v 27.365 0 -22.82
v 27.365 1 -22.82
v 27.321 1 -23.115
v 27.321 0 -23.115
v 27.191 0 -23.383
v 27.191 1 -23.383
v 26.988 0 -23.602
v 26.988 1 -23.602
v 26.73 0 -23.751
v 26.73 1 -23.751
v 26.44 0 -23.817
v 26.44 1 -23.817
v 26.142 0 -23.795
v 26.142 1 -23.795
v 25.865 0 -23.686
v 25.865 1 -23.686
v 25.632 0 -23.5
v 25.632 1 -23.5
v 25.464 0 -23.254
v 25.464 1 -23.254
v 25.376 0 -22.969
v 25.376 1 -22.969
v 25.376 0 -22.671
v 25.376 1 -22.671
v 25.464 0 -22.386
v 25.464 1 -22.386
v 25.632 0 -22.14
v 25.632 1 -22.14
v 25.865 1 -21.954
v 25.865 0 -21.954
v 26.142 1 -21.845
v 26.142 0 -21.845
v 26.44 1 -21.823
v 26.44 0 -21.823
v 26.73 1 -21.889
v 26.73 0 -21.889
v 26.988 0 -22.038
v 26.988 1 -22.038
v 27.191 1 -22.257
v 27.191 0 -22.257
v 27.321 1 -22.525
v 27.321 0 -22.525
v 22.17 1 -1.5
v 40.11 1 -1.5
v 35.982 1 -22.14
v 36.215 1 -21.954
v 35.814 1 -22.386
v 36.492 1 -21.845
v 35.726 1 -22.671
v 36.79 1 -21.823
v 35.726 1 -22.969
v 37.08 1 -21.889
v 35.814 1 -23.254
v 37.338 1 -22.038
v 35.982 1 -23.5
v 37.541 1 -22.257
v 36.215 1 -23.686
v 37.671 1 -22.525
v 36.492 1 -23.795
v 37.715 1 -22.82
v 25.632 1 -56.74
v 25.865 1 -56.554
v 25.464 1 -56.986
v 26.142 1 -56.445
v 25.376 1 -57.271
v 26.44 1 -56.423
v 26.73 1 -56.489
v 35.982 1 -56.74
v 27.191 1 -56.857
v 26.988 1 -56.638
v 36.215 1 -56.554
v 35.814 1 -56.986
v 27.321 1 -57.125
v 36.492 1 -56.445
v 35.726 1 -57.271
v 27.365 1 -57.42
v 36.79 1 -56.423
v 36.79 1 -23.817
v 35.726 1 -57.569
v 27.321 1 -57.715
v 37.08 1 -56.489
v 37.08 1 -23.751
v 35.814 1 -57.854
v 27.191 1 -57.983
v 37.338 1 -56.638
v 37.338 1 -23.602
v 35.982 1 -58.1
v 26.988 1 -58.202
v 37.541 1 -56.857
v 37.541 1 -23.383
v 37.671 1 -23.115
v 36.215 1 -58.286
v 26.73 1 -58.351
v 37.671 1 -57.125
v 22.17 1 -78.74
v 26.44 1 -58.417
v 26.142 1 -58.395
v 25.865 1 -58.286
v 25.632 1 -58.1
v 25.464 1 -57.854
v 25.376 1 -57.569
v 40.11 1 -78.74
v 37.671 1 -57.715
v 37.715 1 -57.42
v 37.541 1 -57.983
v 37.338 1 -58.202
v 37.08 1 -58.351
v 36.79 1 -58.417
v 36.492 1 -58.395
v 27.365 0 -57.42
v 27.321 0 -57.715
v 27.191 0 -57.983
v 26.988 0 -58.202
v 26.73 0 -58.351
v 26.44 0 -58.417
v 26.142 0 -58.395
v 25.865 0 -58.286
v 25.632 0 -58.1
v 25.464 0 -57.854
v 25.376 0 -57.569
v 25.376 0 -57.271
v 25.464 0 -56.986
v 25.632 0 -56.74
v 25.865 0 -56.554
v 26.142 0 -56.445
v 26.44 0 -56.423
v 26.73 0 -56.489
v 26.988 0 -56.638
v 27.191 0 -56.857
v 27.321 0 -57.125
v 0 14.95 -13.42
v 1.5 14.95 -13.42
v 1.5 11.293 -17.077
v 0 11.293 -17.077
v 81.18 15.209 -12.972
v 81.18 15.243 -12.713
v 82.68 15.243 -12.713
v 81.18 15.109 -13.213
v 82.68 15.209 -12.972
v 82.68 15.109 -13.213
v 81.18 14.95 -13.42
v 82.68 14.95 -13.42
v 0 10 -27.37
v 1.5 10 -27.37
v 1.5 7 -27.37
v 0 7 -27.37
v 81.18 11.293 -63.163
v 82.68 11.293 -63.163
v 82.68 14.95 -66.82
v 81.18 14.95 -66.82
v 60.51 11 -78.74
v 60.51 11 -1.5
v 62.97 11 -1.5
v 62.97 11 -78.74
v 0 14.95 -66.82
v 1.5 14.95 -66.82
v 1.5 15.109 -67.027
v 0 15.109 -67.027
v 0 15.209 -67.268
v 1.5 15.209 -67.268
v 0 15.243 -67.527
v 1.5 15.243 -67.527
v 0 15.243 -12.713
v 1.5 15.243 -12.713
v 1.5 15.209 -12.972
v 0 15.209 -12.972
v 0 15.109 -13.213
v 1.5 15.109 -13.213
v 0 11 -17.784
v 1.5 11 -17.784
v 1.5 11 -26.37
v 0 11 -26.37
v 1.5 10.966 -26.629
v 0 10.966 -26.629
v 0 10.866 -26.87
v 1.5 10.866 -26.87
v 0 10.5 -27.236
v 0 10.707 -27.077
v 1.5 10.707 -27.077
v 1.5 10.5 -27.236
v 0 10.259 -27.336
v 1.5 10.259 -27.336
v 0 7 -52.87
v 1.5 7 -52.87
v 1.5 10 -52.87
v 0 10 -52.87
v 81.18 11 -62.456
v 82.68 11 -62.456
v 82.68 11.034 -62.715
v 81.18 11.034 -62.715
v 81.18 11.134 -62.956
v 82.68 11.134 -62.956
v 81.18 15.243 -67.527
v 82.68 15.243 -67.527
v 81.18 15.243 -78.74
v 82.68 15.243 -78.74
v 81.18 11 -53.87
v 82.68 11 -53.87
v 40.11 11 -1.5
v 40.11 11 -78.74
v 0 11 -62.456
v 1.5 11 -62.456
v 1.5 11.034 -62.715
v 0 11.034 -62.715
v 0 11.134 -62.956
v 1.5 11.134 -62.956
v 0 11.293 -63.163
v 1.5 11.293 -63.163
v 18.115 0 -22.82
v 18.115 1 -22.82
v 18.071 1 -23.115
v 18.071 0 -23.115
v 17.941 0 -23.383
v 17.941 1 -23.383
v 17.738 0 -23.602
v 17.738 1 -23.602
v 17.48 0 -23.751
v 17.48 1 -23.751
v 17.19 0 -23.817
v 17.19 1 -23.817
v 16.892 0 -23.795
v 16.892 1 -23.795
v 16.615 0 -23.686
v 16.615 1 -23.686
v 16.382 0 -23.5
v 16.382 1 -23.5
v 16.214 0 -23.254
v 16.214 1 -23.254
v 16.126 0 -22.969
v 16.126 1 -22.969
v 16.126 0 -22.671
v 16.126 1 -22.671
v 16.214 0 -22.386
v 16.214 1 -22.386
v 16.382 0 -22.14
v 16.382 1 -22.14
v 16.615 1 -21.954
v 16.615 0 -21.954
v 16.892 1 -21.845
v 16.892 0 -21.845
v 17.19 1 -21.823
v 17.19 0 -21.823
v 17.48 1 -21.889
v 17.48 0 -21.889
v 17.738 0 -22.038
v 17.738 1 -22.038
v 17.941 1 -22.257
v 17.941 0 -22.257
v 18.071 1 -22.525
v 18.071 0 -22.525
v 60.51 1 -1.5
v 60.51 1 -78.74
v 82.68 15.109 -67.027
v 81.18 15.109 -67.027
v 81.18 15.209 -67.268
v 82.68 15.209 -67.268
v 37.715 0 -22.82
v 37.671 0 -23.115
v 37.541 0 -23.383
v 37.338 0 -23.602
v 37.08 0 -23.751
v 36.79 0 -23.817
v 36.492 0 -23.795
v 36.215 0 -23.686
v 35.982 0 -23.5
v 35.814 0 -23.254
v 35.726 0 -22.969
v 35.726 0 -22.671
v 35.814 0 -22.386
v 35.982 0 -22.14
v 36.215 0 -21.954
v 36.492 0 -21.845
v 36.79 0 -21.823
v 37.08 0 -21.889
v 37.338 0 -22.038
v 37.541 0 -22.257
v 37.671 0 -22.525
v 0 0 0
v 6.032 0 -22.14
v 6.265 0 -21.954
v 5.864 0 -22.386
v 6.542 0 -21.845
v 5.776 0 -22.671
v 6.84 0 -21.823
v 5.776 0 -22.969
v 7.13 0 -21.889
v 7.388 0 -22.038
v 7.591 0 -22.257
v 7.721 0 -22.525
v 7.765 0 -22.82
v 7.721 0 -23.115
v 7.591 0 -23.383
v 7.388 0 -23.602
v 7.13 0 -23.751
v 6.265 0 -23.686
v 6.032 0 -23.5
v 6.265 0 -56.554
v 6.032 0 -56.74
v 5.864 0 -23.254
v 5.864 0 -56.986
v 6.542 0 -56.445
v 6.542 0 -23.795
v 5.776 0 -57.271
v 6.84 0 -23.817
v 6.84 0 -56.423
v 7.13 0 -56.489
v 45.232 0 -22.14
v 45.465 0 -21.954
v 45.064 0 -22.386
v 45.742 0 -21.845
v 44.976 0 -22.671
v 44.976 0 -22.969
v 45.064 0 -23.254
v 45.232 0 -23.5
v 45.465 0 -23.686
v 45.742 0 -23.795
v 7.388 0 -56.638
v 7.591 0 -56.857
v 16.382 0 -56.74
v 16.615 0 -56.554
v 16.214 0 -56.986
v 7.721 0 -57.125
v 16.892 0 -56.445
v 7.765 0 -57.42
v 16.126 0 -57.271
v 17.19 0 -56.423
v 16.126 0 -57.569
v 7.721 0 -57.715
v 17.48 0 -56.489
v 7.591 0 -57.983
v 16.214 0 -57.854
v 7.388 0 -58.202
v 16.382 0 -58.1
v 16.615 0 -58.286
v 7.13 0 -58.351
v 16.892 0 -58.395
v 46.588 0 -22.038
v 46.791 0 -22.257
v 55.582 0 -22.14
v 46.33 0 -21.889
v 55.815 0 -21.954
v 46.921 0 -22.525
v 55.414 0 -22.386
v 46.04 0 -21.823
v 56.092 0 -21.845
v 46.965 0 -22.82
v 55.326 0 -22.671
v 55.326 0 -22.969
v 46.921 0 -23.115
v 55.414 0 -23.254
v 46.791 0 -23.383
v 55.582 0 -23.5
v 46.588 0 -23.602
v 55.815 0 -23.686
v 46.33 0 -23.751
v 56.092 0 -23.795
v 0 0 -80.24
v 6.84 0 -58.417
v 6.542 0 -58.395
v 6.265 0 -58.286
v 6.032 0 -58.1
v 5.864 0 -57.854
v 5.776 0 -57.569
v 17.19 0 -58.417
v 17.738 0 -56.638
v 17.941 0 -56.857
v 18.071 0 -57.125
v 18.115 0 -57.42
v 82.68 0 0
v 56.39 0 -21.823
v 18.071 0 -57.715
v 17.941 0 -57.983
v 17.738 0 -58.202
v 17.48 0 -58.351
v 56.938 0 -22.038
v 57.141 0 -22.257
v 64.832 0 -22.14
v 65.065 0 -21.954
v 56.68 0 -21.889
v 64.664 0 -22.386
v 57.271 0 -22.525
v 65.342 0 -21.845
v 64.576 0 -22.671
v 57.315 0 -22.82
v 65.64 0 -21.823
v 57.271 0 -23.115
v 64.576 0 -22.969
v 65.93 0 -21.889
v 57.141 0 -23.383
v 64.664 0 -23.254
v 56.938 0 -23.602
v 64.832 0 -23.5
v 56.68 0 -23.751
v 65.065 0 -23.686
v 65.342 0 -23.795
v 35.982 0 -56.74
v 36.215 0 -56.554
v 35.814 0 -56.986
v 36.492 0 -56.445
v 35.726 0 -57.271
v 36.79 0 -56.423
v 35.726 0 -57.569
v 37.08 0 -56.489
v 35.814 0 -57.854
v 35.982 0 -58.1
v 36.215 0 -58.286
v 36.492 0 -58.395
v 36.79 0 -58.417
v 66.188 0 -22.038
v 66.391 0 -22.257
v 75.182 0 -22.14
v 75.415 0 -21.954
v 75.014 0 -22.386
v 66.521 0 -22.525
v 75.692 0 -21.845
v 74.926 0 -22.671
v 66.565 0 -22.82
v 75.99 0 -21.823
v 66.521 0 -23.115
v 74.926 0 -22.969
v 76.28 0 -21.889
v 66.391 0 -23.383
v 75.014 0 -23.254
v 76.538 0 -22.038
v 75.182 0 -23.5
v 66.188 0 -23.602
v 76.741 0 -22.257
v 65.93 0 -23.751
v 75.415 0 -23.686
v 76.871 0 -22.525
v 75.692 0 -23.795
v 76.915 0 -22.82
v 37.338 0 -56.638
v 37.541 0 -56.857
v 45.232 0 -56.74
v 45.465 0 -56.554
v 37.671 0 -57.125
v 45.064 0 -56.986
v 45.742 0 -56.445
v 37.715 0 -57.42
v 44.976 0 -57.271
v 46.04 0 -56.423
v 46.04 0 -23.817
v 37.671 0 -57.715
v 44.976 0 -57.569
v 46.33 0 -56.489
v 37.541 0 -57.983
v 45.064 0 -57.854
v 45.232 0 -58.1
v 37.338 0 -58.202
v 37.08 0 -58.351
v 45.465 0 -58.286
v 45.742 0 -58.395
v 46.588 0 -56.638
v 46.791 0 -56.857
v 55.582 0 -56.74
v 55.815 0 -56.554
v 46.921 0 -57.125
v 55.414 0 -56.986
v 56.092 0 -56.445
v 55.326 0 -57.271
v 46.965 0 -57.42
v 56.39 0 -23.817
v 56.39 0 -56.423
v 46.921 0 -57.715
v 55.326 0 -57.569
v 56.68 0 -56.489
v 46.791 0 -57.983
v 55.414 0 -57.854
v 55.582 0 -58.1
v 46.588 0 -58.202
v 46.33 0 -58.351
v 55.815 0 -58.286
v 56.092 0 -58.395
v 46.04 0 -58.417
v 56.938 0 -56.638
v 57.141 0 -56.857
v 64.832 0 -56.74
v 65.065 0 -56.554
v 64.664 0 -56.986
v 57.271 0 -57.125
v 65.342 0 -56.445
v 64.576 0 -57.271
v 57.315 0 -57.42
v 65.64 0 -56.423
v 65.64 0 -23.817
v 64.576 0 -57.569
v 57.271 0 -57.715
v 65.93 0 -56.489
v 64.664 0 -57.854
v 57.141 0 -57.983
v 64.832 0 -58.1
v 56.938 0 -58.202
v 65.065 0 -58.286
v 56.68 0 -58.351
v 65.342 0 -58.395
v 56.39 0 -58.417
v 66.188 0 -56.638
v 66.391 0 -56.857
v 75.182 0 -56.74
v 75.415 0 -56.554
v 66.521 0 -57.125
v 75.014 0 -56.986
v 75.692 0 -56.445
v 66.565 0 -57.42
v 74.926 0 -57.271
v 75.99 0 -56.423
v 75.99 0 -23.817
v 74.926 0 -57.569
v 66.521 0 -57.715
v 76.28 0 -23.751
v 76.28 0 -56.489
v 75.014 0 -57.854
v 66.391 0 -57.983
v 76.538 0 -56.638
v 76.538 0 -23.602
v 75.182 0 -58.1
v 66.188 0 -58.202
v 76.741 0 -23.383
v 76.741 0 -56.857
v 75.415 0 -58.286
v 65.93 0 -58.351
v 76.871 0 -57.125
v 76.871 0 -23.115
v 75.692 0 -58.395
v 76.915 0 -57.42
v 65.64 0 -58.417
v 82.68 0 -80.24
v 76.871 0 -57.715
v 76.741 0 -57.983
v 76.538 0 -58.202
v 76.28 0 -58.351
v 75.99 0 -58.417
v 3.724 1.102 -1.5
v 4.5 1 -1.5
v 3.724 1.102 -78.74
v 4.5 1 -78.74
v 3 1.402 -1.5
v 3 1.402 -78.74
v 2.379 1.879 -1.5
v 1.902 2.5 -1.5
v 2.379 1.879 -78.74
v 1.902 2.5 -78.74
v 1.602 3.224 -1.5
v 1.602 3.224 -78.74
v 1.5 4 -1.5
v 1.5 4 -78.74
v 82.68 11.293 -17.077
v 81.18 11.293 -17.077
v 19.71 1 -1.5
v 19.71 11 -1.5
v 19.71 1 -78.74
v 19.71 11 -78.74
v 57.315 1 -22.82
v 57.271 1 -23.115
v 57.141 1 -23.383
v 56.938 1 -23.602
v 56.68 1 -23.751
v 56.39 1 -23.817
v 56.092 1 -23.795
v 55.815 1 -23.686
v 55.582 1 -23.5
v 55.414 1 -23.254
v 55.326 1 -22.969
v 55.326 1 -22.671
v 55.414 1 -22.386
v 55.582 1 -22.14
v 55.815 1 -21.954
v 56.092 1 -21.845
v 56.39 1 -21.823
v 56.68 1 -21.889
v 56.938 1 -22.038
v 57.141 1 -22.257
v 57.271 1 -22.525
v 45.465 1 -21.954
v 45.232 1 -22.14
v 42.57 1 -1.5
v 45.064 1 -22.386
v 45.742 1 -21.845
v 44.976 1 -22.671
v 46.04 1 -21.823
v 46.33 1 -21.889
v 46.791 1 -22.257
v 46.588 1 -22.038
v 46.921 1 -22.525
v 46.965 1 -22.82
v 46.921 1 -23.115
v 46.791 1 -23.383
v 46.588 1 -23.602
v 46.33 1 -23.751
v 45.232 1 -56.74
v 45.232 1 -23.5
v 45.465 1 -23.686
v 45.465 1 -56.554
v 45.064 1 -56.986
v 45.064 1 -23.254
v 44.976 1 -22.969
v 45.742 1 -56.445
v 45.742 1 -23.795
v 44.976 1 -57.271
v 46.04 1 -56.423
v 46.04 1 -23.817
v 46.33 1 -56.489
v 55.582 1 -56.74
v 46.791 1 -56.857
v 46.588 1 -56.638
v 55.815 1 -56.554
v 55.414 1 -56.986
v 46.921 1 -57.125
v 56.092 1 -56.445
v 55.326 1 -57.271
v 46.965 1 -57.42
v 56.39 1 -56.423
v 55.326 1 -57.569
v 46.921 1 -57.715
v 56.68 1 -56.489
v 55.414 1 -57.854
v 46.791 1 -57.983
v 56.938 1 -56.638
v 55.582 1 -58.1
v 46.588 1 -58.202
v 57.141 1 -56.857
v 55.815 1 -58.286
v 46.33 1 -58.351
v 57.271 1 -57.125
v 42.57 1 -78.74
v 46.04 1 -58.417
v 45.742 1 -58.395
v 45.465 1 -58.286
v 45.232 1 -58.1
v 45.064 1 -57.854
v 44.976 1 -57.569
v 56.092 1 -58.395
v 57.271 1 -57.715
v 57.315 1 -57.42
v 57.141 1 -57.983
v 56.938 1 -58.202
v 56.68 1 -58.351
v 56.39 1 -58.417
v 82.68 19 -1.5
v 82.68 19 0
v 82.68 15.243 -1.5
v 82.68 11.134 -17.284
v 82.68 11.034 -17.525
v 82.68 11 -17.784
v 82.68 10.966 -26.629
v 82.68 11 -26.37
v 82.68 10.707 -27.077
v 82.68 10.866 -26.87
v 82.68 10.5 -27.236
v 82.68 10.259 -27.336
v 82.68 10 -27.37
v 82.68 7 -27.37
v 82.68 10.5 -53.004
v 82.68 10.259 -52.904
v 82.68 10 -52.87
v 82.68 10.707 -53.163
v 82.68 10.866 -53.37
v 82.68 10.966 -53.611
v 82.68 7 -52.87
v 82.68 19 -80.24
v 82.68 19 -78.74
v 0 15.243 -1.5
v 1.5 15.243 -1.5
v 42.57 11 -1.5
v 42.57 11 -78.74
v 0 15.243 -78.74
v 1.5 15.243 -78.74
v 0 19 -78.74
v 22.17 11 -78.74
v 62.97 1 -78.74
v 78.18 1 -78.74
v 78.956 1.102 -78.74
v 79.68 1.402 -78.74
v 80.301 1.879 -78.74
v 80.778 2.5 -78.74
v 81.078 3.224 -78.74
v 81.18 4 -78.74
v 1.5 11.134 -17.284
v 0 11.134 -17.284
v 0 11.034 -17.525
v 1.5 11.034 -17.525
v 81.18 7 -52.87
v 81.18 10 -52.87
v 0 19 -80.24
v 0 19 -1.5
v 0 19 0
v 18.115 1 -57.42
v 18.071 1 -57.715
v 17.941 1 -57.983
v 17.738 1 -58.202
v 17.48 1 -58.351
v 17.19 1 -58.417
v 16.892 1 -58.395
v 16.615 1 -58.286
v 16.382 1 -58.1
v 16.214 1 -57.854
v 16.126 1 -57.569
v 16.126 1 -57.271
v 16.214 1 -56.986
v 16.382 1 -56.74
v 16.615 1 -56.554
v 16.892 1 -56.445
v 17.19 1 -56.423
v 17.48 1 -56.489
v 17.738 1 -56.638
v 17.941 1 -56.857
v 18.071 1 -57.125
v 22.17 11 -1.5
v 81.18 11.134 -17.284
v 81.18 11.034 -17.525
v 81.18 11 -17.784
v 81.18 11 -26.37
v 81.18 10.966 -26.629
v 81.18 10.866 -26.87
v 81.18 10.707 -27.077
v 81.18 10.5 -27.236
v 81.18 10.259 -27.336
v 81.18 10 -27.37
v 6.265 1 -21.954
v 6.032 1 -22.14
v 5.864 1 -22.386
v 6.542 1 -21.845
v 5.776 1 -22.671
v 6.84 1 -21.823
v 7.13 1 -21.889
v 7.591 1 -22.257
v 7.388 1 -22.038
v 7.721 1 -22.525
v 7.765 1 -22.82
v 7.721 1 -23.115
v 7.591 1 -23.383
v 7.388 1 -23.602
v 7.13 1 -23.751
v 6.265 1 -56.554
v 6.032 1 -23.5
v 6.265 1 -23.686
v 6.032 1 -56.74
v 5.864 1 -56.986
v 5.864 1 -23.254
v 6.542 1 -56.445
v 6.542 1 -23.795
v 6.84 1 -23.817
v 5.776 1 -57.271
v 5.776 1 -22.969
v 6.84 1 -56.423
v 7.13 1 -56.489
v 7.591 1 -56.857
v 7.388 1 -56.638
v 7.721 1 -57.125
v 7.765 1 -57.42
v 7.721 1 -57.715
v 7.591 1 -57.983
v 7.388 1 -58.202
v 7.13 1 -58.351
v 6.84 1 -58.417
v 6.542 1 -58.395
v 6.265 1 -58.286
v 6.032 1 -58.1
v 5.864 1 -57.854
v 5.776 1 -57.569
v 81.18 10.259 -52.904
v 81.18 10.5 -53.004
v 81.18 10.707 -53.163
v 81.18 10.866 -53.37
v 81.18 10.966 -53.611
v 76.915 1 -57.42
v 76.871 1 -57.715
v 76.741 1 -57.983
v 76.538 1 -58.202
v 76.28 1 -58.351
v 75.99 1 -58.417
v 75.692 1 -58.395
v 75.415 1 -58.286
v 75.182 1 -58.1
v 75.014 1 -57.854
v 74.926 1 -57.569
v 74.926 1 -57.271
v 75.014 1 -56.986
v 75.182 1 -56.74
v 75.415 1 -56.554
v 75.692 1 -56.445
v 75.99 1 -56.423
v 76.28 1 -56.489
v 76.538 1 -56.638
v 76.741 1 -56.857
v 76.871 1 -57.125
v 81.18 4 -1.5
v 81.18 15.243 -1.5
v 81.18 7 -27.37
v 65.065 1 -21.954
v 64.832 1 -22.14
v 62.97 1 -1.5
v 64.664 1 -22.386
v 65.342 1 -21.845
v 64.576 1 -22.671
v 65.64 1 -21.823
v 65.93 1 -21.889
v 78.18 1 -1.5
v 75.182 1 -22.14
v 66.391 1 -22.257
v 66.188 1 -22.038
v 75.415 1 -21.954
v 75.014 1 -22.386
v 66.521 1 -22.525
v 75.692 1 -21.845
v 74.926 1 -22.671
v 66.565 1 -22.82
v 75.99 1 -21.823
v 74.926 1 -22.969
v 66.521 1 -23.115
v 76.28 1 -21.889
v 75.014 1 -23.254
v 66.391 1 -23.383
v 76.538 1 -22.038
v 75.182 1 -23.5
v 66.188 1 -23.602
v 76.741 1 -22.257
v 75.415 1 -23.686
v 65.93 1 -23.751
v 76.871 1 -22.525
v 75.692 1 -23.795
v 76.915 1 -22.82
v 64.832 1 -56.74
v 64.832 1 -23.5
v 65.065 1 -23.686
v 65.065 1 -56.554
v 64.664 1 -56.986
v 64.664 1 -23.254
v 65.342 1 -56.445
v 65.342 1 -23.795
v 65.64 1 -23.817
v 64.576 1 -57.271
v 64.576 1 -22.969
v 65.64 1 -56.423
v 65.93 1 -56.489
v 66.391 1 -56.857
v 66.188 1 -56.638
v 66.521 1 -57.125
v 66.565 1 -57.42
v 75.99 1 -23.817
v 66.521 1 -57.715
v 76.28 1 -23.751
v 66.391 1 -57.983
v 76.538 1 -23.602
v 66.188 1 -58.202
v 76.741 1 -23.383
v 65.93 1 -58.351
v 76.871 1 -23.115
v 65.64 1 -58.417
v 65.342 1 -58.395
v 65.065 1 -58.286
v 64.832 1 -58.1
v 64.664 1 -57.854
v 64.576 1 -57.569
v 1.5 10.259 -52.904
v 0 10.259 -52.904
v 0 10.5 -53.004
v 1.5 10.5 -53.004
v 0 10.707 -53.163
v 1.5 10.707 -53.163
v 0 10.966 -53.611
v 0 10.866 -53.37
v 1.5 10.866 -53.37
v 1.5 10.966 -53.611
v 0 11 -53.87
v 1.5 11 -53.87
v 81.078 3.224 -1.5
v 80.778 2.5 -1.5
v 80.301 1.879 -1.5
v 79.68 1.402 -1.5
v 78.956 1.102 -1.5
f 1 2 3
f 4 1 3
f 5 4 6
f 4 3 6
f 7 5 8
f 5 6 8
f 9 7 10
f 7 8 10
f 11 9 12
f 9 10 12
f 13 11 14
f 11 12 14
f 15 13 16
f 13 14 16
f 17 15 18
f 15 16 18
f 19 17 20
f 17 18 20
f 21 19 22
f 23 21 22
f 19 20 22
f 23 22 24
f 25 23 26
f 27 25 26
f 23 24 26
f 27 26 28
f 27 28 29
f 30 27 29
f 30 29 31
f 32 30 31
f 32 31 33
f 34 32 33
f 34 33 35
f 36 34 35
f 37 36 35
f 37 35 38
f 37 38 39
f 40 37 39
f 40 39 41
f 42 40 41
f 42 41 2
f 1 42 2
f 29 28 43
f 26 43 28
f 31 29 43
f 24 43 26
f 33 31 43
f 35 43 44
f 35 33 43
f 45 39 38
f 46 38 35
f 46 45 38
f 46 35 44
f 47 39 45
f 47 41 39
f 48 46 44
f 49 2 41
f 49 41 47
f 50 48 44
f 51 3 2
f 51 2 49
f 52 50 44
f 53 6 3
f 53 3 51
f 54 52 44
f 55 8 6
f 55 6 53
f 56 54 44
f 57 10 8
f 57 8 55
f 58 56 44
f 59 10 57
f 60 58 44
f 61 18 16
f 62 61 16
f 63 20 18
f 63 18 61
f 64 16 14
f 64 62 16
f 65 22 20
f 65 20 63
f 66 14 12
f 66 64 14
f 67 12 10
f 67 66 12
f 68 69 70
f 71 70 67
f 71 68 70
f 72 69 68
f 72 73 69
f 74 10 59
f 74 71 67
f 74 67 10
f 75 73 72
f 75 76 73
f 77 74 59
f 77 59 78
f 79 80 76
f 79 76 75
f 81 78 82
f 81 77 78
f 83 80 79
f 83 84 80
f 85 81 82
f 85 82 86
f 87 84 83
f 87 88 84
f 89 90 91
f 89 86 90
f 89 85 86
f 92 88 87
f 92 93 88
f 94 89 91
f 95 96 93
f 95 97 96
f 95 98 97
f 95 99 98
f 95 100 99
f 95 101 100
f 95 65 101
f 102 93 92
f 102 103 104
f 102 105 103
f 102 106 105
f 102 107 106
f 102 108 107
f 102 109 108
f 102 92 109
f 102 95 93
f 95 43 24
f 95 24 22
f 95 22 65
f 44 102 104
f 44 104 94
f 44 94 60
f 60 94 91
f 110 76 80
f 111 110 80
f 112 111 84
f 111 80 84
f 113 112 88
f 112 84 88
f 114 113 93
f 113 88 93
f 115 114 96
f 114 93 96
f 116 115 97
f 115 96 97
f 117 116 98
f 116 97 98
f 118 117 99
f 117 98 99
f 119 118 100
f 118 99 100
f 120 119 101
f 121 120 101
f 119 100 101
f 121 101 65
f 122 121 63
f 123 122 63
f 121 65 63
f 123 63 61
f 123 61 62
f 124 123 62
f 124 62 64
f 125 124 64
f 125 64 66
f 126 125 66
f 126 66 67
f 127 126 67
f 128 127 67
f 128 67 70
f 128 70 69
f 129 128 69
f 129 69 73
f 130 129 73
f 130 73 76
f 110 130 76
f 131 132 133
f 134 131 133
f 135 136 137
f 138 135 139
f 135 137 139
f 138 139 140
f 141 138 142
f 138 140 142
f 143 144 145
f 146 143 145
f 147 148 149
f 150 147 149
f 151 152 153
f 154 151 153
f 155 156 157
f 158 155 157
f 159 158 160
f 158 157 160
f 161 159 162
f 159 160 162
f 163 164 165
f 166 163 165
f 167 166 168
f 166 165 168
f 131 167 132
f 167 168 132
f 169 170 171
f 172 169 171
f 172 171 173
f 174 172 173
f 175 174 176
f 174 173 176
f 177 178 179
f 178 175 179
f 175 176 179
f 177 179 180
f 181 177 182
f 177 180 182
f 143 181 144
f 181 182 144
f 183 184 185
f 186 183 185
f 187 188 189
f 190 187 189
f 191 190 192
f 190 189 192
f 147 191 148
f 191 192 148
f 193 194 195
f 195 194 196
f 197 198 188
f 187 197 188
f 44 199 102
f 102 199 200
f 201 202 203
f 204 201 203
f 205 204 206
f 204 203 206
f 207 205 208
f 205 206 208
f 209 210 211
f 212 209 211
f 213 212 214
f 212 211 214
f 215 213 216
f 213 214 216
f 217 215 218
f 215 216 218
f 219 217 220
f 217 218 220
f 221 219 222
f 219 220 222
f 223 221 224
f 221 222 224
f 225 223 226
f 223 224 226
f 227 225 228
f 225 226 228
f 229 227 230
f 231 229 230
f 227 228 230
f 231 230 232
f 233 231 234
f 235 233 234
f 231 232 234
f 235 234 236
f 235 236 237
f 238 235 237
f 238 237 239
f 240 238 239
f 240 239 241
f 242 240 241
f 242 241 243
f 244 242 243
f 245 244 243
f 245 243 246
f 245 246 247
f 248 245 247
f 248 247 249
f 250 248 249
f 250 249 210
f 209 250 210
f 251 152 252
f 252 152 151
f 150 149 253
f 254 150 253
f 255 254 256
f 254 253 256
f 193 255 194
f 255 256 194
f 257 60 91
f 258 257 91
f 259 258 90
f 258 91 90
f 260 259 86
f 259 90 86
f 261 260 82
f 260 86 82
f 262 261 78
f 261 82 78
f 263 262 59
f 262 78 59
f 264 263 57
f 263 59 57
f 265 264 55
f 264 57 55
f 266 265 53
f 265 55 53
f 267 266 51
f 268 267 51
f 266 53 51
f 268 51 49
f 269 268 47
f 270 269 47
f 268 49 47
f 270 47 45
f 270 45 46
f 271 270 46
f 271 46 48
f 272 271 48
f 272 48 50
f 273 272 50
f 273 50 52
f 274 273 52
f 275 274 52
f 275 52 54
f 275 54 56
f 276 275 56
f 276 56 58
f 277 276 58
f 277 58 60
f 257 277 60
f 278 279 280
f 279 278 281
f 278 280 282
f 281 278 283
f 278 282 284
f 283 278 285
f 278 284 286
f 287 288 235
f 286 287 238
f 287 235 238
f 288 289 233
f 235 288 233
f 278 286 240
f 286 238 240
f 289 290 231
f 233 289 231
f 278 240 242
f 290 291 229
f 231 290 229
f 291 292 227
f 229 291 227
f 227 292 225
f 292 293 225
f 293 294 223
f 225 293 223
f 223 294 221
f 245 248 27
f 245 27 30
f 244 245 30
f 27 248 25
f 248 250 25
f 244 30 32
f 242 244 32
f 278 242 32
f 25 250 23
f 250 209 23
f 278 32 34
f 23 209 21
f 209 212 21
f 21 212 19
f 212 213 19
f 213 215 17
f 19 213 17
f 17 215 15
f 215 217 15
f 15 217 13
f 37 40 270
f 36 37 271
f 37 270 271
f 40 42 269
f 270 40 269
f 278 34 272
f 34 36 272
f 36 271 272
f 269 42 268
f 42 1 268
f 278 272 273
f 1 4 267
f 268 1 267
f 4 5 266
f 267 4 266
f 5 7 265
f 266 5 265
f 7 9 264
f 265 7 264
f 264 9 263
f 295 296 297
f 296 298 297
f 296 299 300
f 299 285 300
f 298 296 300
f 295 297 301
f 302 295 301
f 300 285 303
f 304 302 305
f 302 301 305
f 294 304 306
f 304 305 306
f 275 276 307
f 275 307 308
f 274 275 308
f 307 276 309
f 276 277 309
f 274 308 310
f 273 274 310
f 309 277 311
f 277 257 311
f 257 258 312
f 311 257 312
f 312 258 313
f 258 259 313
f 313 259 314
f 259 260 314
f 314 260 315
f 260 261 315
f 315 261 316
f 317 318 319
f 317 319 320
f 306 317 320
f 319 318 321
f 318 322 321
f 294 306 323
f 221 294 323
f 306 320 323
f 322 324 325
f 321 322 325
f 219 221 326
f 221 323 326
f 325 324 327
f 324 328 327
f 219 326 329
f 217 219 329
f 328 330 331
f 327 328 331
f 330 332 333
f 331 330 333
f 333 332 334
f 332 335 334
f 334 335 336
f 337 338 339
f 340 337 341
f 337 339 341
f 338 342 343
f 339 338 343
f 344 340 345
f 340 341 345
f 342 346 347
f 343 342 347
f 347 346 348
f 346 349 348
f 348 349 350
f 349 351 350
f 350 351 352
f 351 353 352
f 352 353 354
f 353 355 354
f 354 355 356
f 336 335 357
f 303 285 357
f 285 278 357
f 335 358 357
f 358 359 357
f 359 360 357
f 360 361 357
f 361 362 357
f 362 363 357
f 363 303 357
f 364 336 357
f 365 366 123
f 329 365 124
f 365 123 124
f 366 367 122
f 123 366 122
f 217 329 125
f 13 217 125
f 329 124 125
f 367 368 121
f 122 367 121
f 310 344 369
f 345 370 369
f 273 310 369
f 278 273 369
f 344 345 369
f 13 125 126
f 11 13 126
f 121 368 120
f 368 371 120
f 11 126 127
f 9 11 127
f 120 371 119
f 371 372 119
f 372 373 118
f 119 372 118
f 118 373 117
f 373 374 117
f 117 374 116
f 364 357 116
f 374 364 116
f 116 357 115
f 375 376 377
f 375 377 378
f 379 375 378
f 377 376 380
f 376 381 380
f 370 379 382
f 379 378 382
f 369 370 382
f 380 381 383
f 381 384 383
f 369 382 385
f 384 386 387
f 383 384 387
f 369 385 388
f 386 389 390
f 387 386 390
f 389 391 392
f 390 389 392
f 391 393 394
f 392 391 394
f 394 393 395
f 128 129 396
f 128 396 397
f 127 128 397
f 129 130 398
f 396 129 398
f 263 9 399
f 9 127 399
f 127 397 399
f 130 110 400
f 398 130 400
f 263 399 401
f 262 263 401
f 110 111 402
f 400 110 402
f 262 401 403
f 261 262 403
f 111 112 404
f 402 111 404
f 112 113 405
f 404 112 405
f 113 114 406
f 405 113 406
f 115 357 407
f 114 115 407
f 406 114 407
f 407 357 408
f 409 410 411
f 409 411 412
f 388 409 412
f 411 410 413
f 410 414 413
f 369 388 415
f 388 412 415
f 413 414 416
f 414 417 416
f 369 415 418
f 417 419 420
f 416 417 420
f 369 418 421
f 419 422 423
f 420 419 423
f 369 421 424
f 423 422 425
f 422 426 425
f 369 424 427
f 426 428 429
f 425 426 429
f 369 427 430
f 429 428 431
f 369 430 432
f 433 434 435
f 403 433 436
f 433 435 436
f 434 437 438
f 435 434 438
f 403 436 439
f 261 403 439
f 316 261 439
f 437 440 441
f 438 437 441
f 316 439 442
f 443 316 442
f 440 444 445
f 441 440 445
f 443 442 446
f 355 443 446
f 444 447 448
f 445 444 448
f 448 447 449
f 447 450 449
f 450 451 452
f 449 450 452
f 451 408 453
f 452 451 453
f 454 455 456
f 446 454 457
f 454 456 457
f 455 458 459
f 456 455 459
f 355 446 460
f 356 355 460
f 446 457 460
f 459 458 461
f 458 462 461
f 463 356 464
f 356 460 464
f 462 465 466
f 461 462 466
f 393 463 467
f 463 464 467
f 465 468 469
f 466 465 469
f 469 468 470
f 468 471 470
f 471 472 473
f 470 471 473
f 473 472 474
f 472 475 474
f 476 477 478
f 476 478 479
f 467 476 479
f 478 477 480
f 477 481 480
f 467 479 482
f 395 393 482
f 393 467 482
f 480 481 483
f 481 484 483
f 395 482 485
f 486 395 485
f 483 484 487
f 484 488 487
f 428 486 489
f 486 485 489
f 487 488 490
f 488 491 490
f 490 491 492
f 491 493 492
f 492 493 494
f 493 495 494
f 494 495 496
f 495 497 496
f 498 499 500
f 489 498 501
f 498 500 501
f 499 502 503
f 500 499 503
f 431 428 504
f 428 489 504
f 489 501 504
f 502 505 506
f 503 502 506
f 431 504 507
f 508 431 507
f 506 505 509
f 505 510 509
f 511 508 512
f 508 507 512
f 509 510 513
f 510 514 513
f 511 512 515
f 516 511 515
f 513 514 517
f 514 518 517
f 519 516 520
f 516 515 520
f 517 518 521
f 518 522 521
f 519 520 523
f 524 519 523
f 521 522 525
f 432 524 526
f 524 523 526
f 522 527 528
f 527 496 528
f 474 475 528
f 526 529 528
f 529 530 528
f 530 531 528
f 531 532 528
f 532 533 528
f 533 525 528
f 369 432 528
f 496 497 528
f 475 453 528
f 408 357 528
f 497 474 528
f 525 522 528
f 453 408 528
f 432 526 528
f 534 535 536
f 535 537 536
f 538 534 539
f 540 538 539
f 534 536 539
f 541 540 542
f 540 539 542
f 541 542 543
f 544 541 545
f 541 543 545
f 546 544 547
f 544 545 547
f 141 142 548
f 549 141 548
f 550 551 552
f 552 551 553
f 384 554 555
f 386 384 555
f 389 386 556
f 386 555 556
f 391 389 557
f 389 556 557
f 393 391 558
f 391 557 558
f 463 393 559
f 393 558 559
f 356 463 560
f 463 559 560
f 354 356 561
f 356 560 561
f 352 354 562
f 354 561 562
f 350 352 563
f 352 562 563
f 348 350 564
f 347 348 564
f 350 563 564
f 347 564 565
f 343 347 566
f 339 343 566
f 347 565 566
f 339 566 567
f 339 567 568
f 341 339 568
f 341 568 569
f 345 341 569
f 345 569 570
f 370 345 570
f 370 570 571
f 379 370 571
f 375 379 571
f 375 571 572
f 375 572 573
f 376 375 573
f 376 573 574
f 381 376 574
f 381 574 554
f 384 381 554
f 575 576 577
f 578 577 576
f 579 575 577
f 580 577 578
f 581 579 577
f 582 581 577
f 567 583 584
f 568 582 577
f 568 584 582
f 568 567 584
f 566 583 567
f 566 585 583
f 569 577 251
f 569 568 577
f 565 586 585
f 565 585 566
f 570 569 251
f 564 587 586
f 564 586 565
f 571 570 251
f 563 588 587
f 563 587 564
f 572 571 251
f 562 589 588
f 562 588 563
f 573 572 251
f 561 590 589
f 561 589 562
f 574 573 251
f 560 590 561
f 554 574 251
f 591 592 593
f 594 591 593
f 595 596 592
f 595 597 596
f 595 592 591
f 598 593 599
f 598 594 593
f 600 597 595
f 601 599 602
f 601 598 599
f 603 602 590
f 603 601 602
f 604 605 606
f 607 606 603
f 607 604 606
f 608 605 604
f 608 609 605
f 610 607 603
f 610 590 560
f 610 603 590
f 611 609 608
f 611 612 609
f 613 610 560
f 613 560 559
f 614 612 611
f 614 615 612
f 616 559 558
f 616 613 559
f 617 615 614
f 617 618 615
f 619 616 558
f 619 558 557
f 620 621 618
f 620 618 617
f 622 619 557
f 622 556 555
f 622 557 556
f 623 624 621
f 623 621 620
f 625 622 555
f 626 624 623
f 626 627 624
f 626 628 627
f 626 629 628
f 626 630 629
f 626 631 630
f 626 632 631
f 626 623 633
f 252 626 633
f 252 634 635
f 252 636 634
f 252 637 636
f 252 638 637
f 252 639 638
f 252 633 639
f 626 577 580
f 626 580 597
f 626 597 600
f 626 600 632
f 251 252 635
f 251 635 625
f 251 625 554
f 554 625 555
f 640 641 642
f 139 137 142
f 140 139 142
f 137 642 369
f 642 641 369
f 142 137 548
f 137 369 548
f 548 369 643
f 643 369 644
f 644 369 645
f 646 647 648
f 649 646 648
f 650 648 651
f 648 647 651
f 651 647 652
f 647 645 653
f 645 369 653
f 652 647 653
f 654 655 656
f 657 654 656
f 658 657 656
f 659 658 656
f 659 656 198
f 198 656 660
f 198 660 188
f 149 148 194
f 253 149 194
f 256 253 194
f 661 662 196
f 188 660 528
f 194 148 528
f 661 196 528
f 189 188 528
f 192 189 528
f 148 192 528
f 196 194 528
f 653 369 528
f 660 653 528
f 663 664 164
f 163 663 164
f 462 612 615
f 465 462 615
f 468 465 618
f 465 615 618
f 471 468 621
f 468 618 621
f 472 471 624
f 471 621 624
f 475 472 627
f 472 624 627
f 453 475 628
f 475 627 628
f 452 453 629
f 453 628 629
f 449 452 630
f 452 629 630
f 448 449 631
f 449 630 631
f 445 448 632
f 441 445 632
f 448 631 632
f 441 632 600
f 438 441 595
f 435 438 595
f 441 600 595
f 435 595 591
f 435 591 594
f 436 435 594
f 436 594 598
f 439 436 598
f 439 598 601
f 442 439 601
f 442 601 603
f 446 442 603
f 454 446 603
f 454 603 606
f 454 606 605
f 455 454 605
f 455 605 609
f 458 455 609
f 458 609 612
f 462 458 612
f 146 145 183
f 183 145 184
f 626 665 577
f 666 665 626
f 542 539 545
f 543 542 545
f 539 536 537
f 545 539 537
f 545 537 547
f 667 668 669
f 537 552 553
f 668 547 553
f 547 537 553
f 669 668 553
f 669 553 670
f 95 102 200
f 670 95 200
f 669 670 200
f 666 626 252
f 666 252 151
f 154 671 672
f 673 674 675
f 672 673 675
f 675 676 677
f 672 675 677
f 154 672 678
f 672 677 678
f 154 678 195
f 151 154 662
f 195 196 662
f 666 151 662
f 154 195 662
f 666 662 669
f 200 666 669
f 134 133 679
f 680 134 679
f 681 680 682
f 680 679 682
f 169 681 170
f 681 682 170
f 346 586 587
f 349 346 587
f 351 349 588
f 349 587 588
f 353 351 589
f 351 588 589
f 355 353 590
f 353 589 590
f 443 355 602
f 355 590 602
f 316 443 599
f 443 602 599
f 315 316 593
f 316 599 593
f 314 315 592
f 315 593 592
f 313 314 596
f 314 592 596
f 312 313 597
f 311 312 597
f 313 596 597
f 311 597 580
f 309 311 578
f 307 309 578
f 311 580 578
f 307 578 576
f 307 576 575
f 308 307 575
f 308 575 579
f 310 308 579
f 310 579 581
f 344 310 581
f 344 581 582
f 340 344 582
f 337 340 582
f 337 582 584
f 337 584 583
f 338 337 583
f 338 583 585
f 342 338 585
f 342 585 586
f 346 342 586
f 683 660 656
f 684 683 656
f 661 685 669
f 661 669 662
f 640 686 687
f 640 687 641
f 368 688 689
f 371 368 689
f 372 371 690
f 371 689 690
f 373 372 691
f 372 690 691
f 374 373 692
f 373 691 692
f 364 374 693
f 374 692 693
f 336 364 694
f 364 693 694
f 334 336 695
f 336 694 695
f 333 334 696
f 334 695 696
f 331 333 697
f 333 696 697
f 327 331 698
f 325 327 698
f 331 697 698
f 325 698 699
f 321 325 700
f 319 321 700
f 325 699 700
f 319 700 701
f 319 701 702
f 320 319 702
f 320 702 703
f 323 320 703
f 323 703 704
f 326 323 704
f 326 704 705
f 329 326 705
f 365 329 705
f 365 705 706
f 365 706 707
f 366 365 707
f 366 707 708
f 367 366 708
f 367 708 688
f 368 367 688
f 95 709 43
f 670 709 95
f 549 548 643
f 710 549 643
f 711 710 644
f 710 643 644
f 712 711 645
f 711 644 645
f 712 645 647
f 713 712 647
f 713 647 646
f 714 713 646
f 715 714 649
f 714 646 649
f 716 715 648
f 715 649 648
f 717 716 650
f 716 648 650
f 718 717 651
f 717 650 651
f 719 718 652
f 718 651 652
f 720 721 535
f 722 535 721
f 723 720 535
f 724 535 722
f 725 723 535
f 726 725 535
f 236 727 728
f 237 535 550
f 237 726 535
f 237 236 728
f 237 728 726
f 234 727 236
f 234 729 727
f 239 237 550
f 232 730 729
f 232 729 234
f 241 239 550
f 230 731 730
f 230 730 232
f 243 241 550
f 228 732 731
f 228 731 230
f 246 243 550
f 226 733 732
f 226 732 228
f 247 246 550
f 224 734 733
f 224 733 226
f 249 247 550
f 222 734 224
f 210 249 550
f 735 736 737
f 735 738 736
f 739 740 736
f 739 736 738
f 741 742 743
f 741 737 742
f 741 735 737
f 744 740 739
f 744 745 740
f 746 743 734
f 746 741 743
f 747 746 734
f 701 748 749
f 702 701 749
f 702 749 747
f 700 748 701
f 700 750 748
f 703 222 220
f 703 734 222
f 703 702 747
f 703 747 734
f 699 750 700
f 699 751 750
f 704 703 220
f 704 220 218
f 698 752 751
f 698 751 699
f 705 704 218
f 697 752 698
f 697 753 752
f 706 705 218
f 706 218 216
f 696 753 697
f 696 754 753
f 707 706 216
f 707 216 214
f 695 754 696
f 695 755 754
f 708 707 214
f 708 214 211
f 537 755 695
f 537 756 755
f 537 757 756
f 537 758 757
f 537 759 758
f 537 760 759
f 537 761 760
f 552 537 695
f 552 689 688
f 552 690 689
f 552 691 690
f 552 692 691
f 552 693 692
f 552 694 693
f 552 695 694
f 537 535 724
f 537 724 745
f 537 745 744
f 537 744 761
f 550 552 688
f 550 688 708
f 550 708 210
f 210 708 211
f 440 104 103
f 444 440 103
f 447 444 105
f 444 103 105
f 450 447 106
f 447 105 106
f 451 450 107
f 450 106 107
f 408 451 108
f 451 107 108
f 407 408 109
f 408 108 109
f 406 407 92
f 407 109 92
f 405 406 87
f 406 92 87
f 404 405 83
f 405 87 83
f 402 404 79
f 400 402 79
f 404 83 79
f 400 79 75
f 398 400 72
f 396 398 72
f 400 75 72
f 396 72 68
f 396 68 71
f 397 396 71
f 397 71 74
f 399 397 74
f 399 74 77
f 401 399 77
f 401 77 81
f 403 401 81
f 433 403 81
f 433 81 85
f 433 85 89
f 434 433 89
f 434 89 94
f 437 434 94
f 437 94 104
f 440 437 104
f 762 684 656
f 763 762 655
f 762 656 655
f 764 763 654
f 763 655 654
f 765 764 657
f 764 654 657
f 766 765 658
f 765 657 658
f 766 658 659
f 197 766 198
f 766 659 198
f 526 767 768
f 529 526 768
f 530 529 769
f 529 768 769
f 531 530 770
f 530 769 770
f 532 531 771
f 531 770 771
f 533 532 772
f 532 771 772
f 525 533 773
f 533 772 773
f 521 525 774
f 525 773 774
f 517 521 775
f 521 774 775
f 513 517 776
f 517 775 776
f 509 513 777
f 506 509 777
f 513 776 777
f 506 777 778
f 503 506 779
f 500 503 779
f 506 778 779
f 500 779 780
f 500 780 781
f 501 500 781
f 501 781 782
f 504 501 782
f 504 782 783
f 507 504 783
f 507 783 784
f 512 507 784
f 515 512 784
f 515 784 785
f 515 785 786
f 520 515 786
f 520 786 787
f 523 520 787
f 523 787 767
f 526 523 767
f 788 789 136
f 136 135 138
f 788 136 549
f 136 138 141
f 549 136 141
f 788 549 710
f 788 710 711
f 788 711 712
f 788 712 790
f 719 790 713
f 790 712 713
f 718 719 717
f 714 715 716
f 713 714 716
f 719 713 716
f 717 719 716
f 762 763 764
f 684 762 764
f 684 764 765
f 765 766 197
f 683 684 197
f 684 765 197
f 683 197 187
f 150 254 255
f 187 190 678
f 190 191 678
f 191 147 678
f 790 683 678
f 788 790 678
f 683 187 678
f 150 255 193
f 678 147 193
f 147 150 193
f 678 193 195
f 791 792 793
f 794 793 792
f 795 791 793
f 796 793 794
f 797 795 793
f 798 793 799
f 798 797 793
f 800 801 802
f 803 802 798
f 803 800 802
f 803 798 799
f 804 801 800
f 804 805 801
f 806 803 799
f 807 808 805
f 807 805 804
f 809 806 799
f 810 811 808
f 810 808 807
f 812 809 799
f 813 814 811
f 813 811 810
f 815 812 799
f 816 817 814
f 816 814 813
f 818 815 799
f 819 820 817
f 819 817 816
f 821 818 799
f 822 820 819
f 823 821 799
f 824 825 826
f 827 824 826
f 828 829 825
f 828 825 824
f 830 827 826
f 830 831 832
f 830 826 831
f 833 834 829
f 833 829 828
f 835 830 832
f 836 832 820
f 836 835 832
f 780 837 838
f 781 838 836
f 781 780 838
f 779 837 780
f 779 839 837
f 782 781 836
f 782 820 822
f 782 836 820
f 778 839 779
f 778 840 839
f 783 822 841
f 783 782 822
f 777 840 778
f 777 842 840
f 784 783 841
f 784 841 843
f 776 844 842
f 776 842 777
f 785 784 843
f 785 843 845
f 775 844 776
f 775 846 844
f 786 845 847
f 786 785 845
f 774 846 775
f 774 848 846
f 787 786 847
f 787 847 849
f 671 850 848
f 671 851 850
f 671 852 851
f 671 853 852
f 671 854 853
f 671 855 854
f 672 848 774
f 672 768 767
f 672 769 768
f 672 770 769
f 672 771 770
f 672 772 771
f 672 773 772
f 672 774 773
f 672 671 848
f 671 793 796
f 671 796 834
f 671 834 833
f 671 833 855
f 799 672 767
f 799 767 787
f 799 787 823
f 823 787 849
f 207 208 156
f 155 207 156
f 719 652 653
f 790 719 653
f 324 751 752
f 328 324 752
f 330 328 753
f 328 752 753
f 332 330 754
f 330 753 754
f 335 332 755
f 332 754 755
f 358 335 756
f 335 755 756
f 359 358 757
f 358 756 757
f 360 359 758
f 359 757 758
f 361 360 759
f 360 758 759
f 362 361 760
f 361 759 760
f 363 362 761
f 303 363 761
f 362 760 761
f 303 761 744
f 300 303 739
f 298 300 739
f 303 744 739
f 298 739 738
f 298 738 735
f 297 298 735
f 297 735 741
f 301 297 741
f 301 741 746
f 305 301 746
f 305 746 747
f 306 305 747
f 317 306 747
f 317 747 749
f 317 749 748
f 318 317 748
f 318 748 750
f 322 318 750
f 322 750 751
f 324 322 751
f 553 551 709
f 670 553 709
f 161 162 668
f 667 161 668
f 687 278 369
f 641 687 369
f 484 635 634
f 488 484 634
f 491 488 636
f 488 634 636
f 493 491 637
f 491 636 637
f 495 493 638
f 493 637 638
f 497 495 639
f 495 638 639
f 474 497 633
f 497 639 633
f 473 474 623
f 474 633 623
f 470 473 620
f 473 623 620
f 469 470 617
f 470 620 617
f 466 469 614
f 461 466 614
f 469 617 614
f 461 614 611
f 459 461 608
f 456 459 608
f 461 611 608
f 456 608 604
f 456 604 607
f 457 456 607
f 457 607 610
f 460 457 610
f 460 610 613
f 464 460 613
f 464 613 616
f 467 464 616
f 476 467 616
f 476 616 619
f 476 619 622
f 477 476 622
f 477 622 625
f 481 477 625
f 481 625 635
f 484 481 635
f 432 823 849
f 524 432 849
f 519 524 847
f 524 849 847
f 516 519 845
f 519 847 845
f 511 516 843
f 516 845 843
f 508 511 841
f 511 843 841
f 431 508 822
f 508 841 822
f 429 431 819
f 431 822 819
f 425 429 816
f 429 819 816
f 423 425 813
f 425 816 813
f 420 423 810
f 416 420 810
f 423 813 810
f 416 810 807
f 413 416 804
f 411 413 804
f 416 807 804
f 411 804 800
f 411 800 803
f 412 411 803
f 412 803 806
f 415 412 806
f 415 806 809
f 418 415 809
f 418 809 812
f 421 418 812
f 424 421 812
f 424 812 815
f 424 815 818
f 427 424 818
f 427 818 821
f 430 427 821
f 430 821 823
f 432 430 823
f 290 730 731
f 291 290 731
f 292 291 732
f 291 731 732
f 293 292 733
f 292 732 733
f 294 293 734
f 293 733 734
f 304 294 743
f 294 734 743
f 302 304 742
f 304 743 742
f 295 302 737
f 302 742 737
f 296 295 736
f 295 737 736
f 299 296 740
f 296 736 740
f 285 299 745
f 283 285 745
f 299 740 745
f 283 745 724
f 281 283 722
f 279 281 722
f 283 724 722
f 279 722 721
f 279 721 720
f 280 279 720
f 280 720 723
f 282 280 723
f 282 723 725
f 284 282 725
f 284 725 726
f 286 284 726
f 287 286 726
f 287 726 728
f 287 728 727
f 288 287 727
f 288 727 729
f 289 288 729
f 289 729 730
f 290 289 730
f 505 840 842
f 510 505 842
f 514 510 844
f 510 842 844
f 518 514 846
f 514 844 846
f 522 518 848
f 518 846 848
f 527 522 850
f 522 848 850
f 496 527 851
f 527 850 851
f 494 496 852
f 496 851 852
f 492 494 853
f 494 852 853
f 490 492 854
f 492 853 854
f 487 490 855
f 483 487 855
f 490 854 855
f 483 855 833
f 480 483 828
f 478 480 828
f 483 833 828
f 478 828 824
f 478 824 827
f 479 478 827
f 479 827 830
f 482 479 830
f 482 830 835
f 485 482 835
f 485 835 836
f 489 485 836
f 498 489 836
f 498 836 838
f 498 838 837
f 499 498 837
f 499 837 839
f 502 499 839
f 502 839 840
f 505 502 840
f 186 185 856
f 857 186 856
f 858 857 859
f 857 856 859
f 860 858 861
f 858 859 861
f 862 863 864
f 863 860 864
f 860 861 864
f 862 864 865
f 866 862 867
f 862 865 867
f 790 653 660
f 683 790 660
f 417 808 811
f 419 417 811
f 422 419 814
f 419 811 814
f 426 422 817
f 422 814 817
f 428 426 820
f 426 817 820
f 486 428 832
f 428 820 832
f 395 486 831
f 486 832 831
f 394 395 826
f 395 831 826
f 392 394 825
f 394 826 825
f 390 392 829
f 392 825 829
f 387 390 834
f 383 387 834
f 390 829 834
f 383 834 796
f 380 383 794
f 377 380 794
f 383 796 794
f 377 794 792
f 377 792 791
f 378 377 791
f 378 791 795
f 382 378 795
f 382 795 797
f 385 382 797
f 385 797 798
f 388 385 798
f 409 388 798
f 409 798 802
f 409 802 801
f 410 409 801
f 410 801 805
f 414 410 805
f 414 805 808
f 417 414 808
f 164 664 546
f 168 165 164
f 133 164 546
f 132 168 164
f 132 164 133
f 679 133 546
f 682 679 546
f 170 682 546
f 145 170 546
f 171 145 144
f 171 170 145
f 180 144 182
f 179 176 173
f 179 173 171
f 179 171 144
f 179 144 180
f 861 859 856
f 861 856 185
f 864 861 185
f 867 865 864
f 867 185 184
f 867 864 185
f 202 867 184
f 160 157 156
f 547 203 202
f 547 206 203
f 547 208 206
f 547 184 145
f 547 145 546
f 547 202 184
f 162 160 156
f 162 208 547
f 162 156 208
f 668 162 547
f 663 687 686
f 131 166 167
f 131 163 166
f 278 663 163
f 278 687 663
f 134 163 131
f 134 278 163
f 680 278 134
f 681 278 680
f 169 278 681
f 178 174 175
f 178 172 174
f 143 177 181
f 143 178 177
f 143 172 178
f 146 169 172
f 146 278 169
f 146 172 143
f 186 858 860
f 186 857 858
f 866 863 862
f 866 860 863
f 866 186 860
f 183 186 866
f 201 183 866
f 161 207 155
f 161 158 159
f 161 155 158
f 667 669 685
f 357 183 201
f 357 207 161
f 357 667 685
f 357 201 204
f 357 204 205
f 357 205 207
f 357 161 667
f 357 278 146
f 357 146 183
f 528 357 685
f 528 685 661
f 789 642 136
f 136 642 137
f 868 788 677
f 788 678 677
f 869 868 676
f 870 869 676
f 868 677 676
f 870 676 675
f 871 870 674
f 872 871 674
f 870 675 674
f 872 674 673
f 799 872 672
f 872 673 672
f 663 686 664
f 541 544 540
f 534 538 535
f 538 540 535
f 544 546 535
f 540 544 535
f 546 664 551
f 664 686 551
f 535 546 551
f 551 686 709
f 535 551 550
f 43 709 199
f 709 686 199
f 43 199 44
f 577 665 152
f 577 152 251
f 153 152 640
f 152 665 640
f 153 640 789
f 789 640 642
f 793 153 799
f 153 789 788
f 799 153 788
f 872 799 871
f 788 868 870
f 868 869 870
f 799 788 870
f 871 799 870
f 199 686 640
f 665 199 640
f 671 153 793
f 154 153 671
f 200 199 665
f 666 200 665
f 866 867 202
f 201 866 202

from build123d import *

# Parameters (mm, degrees)
SKETCH1_W             = 82.68
SKETCH1_H             = 80.24
BOSS_EXTRUDE1_DEPTH   = 19
SKETCH2_W             = 79.68
SKETCH2_H             = 77.24
CUT_EXTRUDE1_DEPTH    = 18
CUT_EXTRUDE2_DEPTH    = 117.770886783
FILLET1_R             = 3
F_2_0MM_DOWEL_HOLE1_D = 2
RIB1_REACH            = 117.739
SKETCH5_WALLS_W       = 2.46
SKETCH5_WALLS_H       = 310.717342304


with BuildPart() as part:
    # Sketch1 → Boss-Extrude1 (new body)
    with BuildSketch(Plane(origin=(0, 0, 0), x_dir=(1, 0, 0), z_dir=(0, 1, 0))):
        with Locations((41.34, 40.12)):
            Rectangle(SKETCH1_W, SKETCH1_H)
    extrude(amount=BOSS_EXTRUDE1_DEPTH)

    # Sketch2 → Cut-Extrude1 (cut)
    with BuildSketch(Plane(origin=(0, 19, 0), x_dir=(1, 0, 0), z_dir=(0, 1, 0))):
        with Locations((41.34, 40.12)):
            Rectangle(SKETCH2_W, SKETCH2_H)
    extrude(amount=-CUT_EXTRUDE1_DEPTH, mode=Mode.SUBTRACT)

    # Sketch3 → Cut-Extrude2 (cut, through all)
    with BuildSketch(Plane(origin=(82.68, 0, 0), x_dir=(0, 0, -1), z_dir=(1, 0, 0))):
        with BuildLine():
            Line((27.37, 7), (52.87, 7))
            Line((52.87, 7), (52.87, 10))
            ThreePointArc((52.87, 10), (53.162893219, 10.707106781), (53.87, 11))
            Line((53.87, 11), (62.455786438, 11))
            ThreePointArc((62.455786438, 11), (62.83846987, 11.076120467), (63.162893219, 11.292893219))
            Line((63.162893219, 11.292893219), (66.819747468, 14.949747468))
            ThreePointArc((66.819747468, 14.949747468), (67.144170817, 15.16652022), (67.526854249, 15.242640687))
            Line((67.526854249, 15.242640687), (78.74, 15.242640687))
            Line((78.74, 15.242640687), (78.74, 19))
            Line((78.74, 19), (1.5, 19))
            Line((1.5, 19), (1.5, 15.242640687))
            Line((1.5, 15.242640687), (12.713145751, 15.242640687))
            ThreePointArc((12.713145751, 15.242640687), (13.095829183, 15.16652022), (13.420252532, 14.949747468))
            Line((13.420252532, 14.949747468), (17.077106781, 11.292893219))
            ThreePointArc((17.077106781, 11.292893219), (17.40153013, 11.076120467), (17.784213562, 11))
            Line((17.784213562, 11), (26.37, 11))
            ThreePointArc((26.37, 11), (27.077106781, 10.707106781), (27.37, 10))
            Line((27.37, 10), (27.37, 7))
        make_face()
    extrude(amount=-CUT_EXTRUDE2_DEPTH, mode=Mode.SUBTRACT)

    # Fillet1
    fillet1_edges = [part.edges().sort_by_distance(p)[0] for p in [
        (81.18, 1, -40.12),
        (1.5, 1, -40.12),
    ]]
    fillet(fillet1_edges, radius=FILLET1_R)

    # Ø2.0mm Dowel Hole1 (through all)
    with Locations(Plane(origin=(0, 0, 0), x_dir=(-1, 0, 0), z_dir=(0, -1, 0))):
        with Locations((-6.765, 57.42), (-17.115, 57.42), (-26.365, 57.42), (-36.715, 57.42), (-45.965, 57.42), (-56.315, 57.42), (-65.565, 57.42), (-75.915, 57.42), (-75.915, 22.82), (-65.565, 22.82), (-56.315, 22.82), (-45.965, 22.82), (-36.715, 22.82), (-26.365, 22.82), (-17.115, 22.82), (-6.765, 22.82)):
            Hole(F_2_0MM_DOWEL_HOLE1_D / 2)

    # Sketch5 walls → Rib1 (add, up to next)
    with BuildSketch(Plane(origin=(0, 11, 0), x_dir=(1, 0, 0), z_dir=(0, 1, 0)), mode=Mode.PRIVATE) as rib1_sk1:
        with Locations((20.94, 40.12)):
            Rectangle(SKETCH5_WALLS_W, SKETCH5_WALLS_H)
    rib1_tool1 = extrude(rib1_sk1.sketch, amount=-RIB1_REACH, mode=Mode.PRIVATE) - part.part
    # Sketch5 walls → Rib1 (add, up to next)
    with BuildSketch(Plane(origin=(0, 11, 0), x_dir=(1, 0, 0), z_dir=(0, 1, 0)), mode=Mode.PRIVATE) as rib1_sk2:
        with Locations((41.34, 40.12)):
            Rectangle(SKETCH5_WALLS_W, SKETCH5_WALLS_H)
    rib1_tool2 = extrude(rib1_sk2.sketch, amount=-RIB1_REACH, mode=Mode.PRIVATE) - part.part
    # Sketch5 walls → Rib1 (add, up to next)
    with BuildSketch(Plane(origin=(0, 11, 0), x_dir=(1, 0, 0), z_dir=(0, 1, 0)), mode=Mode.PRIVATE) as rib1_sk3:
        with Locations((61.74, 40.12)):
            Rectangle(SKETCH5_WALLS_W, SKETCH5_WALLS_H)
    rib1_tool3 = extrude(rib1_sk3.sketch, amount=-RIB1_REACH, mode=Mode.PRIVATE) - part.part
    add(rib1_tool1.solids().sort_by_distance((20.94, 11, -40.12))[0])
    add(rib1_tool2.solids().sort_by_distance((41.34, 11, -40.12))[0])
    add(rib1_tool3.solids().sort_by_distance((61.74, 11, -40.12))[0])


solid = part.part
